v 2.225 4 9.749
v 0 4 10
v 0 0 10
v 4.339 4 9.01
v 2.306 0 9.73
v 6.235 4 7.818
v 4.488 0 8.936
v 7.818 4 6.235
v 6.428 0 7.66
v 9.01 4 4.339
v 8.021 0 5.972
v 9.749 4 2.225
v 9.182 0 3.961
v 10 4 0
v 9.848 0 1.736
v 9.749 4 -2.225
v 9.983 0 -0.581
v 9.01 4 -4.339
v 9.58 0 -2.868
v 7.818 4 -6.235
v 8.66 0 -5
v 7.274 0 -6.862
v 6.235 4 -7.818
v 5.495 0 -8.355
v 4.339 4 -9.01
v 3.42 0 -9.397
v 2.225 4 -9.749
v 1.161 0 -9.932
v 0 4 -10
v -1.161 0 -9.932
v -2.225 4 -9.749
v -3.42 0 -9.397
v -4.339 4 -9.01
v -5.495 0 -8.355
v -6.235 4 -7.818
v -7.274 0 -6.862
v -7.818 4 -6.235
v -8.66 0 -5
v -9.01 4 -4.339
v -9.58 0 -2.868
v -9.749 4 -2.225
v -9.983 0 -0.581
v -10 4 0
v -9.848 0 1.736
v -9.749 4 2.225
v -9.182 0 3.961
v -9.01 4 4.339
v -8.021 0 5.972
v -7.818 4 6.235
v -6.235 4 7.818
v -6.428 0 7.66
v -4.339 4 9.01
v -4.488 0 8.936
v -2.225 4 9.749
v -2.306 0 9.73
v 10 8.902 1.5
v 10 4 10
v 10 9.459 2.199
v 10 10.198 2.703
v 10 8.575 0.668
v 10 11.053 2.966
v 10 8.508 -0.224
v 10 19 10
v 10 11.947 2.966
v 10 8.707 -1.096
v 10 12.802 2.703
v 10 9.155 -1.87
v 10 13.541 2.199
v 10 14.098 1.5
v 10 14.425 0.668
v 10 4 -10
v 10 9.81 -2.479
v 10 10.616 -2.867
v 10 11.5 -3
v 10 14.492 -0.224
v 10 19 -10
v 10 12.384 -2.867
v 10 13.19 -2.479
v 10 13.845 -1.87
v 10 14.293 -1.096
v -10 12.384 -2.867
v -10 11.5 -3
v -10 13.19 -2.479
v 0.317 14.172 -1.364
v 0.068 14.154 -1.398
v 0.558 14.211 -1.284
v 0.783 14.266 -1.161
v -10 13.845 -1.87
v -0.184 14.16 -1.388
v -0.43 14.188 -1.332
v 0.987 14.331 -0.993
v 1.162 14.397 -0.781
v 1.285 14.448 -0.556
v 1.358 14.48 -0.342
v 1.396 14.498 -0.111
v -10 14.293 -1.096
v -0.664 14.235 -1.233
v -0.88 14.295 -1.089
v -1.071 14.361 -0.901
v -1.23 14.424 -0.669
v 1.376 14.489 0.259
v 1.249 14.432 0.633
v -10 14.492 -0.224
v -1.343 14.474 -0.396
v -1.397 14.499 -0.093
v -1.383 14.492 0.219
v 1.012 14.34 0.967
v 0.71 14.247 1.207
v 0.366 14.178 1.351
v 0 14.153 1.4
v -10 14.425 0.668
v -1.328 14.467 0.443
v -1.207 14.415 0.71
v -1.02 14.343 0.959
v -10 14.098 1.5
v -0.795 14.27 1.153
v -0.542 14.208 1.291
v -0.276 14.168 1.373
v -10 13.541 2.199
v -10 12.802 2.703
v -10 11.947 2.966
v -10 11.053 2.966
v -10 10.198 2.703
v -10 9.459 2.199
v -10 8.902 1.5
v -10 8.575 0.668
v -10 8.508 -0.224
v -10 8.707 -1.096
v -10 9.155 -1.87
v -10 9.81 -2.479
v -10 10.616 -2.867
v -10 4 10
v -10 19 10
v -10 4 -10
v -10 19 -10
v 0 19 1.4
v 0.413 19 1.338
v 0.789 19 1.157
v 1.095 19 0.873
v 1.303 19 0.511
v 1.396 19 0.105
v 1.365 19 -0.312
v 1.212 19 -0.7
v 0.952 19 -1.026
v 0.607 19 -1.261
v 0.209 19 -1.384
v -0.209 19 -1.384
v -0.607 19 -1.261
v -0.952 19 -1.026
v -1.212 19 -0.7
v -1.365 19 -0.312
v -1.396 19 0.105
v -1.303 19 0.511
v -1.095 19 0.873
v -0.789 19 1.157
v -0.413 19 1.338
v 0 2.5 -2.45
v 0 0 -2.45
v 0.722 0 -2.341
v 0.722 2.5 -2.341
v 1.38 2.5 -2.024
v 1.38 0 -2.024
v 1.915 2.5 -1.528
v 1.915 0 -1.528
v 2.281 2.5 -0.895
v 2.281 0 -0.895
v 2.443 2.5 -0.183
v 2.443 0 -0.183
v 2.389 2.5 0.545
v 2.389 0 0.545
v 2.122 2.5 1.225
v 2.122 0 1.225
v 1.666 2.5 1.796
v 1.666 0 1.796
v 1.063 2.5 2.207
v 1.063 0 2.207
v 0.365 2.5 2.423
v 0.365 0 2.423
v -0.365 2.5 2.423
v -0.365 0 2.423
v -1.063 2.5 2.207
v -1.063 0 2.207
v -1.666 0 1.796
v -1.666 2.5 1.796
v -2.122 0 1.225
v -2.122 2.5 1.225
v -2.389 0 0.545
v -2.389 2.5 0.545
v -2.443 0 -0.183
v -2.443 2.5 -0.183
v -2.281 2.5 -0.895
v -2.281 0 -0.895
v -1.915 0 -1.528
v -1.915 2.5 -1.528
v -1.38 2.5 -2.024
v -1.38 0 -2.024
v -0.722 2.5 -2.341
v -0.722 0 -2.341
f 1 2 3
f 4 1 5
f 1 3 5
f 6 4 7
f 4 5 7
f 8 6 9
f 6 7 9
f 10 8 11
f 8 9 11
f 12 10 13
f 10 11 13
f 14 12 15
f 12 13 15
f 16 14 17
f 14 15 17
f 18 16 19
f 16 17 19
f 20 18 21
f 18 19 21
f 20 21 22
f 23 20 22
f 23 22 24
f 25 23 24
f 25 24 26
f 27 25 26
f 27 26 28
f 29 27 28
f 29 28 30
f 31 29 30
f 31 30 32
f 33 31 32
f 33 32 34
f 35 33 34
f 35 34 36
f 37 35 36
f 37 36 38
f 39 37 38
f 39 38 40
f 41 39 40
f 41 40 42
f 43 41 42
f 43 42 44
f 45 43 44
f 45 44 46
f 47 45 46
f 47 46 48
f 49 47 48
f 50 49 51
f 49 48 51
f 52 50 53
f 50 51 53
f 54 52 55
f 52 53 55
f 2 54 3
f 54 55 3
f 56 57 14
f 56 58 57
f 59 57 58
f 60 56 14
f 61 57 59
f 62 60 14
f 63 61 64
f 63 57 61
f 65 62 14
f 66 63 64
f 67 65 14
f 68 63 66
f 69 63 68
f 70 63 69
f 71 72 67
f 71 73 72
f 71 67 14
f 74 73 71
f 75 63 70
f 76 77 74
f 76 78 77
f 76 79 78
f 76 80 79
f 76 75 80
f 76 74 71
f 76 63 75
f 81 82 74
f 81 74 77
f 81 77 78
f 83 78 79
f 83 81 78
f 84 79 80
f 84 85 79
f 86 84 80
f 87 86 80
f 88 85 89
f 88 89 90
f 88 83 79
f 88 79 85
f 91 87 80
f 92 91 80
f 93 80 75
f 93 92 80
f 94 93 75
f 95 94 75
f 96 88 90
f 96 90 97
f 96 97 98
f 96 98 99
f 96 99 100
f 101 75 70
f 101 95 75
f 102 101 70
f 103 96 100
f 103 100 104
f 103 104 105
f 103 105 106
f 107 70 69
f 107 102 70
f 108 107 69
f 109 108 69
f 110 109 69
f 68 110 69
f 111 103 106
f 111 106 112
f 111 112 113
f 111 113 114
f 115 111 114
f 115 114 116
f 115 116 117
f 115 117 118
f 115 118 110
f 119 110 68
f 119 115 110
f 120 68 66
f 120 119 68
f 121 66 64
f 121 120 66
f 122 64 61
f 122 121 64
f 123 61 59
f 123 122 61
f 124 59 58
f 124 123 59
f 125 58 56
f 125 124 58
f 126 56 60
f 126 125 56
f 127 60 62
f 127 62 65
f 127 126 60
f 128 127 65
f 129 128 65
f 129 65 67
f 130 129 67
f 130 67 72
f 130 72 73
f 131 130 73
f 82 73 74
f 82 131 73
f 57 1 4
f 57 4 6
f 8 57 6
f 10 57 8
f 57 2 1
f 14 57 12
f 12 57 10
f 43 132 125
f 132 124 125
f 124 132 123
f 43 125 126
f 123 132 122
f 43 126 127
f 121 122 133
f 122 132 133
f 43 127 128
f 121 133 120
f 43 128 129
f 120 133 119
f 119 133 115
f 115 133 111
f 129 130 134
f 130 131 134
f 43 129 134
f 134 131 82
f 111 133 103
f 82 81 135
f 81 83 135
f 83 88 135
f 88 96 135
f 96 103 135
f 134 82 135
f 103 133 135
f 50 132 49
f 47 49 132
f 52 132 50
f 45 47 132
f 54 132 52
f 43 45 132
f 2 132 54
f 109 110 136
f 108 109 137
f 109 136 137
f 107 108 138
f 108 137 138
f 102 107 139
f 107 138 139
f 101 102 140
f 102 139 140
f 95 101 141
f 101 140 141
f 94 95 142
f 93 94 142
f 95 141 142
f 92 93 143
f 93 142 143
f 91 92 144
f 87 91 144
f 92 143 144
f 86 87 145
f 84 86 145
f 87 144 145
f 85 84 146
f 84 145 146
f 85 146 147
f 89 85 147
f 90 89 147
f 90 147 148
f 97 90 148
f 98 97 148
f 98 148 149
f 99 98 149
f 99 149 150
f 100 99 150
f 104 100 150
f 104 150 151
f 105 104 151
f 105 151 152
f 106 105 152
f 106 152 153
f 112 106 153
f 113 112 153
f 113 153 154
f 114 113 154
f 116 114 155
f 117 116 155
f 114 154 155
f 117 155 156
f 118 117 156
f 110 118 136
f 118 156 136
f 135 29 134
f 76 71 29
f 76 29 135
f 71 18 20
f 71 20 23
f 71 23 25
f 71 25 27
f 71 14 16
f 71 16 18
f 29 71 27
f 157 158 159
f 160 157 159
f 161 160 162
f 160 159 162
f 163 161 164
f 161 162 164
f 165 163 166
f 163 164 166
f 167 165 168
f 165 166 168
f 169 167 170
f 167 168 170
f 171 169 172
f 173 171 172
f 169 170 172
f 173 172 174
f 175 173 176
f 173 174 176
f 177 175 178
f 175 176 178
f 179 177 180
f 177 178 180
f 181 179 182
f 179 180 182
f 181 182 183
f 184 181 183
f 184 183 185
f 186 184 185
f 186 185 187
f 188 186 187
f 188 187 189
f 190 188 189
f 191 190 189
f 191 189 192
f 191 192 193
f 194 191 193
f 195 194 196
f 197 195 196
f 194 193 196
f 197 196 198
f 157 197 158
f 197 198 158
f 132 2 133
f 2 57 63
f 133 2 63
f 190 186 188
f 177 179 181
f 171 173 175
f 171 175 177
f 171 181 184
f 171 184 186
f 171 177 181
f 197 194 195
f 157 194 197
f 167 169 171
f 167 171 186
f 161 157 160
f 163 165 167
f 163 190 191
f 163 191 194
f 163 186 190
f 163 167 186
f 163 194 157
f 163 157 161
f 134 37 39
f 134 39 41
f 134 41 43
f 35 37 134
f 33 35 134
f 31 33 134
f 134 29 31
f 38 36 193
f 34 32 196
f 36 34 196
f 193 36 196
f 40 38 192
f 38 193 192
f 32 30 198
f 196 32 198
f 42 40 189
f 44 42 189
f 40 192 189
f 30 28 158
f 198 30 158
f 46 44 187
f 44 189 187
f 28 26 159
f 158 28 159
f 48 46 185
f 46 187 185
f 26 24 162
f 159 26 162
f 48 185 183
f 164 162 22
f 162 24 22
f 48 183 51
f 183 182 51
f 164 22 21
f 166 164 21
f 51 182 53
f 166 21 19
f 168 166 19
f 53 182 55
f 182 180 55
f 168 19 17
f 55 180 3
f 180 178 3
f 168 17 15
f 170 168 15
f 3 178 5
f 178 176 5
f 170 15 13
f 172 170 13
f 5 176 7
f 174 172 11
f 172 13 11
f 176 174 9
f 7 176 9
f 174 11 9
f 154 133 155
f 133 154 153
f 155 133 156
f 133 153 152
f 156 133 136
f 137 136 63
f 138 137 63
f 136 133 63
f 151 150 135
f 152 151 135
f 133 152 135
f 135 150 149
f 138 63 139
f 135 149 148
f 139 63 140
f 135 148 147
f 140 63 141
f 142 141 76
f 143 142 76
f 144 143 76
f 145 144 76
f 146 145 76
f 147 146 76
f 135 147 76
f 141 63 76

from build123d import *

# Parameters (mm, degrees)
SKETCH1_R           = 10
BOSS_EXTRUDE1_DEPTH = 4
SKETCH2_R           = 2.45
CUT_EXTRUDE1_DEPTH  = 2.5
SKETCH3_W           = 20
SKETCH3_H           = 15
SKETCH3_R           = 3
BOSS_EXTRUDE2_DEPTH = 10
SKETCH4_R           = 1.4
CUT_EXTRUDE2_DEPTH  = 8


with BuildPart() as part:
    # Sketch1 → Boss-Extrude1 (new body)
    with BuildSketch(Plane(origin=(0, 0, 0), x_dir=(1, 0, 0), z_dir=(0, 1, 0))):
        with Locations(Location((0, 0, 0), (0, 0, 270))):
            Circle(SKETCH1_R)
    extrude(amount=BOSS_EXTRUDE1_DEPTH)

    # Sketch2 → Cut-Extrude1 (cut)
    with BuildSketch(Plane.XZ):
        with Locations(Location((0, 0, 0), (0, 0, 270))):
            Circle(SKETCH2_R)
    extrude(amount=-CUT_EXTRUDE1_DEPTH, mode=Mode.SUBTRACT)

    # Sketch3 → Boss-Extrude2 (add, symmetric)
    with BuildSketch(Plane(origin=(0, 0, 0), x_dir=(0, 0, -1), z_dir=(1, 0, 0))):
        with Locations((0, 11.5)):
            Rectangle(SKETCH3_W, SKETCH3_H)
        with Locations((0, 11.5)):
            Circle(SKETCH3_R, mode=Mode.SUBTRACT)
    extrude(amount=BOSS_EXTRUDE2_DEPTH, both=True)

    # Sketch4 → Cut-Extrude2 (cut)
    with BuildSketch(Plane(origin=(0, 19, 0), x_dir=(1, 0, 0), z_dir=(0, 1, 0))):
        with Locations(Location((0, 0, 0), (0, 0, 270))):
            Circle(SKETCH4_R)
    extrude(amount=-CUT_EXTRUDE2_DEPTH, mode=Mode.SUBTRACT)


solid = part.part
